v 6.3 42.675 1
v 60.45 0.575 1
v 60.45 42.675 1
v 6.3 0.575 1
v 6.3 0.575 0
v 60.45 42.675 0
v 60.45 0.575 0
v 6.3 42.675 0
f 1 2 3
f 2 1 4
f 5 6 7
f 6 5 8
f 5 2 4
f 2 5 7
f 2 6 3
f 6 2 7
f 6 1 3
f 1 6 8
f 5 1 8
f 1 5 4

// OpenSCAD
// file: ../libraries/commons.scad
/**
 * forEachCoord
 * Wrapper to apply child on each element
 */
module forEachCoord(coords_list) {
    for (coords = coords_list)
        translate(
            [
                coords[0] == undef ? 0 : coords[0],
                coords[1] == undef ? 0 : coords[1],
                coords[2] == undef ? 0 : coords[2],
            ]
        )
            children();
}
// file: ../enveloppes/screenEnveloppe.scad
include <../assets/lcd-screen/configurations.scad>

use <../libraries/commons.scad>

/**
 * screenFixationThrows
 * @name screenFixationThrows
 * @description screenFixationThrows
 * @type enveloppe
 * @parent root
 */
module screenFixationThrows(
    electronic_board_x_size = screen_asset_electronic_board_x_size,
    electronic_board_y_size = screen_asset_electronic_board_y_size,
    x_margin_left = screen_asset_x_margin_throws_left,
    x_margin_right = screen_asset_x_margin_throws_right,
    y_margin_top = screen_asset_y_margin_throws_top,
    y_margin_bottom = screen_asset_y_margin_throws_bottom,
    throw_diameter = 3.1,
    $fn = $fn
) {

    throws_z_size = 20;

    offset_coords_throw_list = [
        [
            x_margin_left,
            y_margin_bottom,
        ],
        [
            x_margin_left,
            electronic_board_y_size - y_margin_top,
        ],
        [
            electronic_board_x_size - x_margin_right,
            electronic_board_y_size - y_margin_top,
        ],
        [
            electronic_board_x_size - x_margin_right,
            y_margin_bottom,
        ]
    ];

    // Fixations throws
    translate([0,0, -throws_z_size / 2])
        forEachCoord(offset_coords_throw_list)
            cylinder(h = throws_z_size, d = throw_diameter, center = false, $fn = $fn);
}


/**
 * screenMainThrow
 * @name screenMainThrow
 * @description screenMainThrow
 * @type enveloppe
 * @parent root
 */
module screenMainThrow(
    electronic_board_x_size = screen_asset_electronic_board_x_size,
    electronic_board_y_size = screen_asset_electronic_board_y_size,
    screen_external_x_size = screen_asset_screen_external_x_size,
    screen_external_y_size = screen_asset_screen_external_y_size,
    screen_throw_x_margin = 2.8,
    screen_throw_y_margin = 0.5
) {

    throws_z_size = 20;

    // Main screen throw
    translate([
        (electronic_board_x_size - screen_external_x_size) / 2 - screen_throw_x_margin,
        (electronic_board_y_size - screen_external_y_size) / 2 - screen_throw_y_margin,
        -throws_z_size / 2
    ])
        cube(
            [
                screen_external_x_size + (screen_throw_x_margin * 2),
                screen_external_y_size + (screen_throw_y_margin * 2),
                throws_z_size,
            ]
        );
}

/**
 * screenConnectorThrow
 * @name screenConnectorThrow
 * @description screenConnectorThrow
 * @type enveloppe
 * @parent root
 */
module screenConnectorThrow(
    electronic_board_y_size = screen_asset_electronic_board_y_size
) {
    throws_z_size = 20;

    translate(
        [
            0.85 - (0.5 / 2),
            11.3,
            -throws_z_size / 2
        ]
    )
        cube(
            [
                2.5 + 0.5,
                electronic_board_y_size - (11.3 * 2),
                throws_z_size
            ]
        );
}

/**
 * sceenVisibleZoneCube
 * @name sceenVisibleZoneCube
 * @description sceenVisibleZoneCube
 * @type enveloppe
 * @parent root
 */
module sceenVisibleZoneCube(
    x_margin = 0,
    y_margin = 0,
    z_size = 0,

    electronic_board_x_size = screen_asset_electronic_board_x_size,
    electronic_board_y_size = screen_asset_electronic_board_y_size,
    screen_external_x_size = screen_asset_screen_external_x_size,
    screen_external_y_size = screen_asset_screen_external_y_size,
) {

    translate([
        (electronic_board_x_size - screen_external_x_size) / 2 + 1 - x_margin,
        (electronic_board_y_size - screen_external_y_size) / 2 + 1 - y_margin,
        0
    ])
        cube(
            [
                screen_external_x_size - 1 - 6.5 + (x_margin * 2),
                screen_external_y_size - 1 - 1 + (y_margin * 2),
                z_size,
            ]
        );
}

sceenVisibleZoneCube();
// file: ../configurations/global.scad
housing_facades_throws_diameter = 3.8;

// external size
case_external_x_size = 90;
case_external_y_size = 140;
case_external_z_size = 38;
case_external_panes_thickness = 4.8;

facade_front_round_edges_radius = 5;
facade_throws_margin = 5;

facade_front_fixation_throws_diameter = housing_facades_throws_diameter;

// facade corners
facade_corners_offset_lenght = 9;
facade_corners_main_x_size = 19;
facade_corners_main_y_size = 19;
facade_corners_main_thickness = 11;
facade_corners_correction_offset_length = 0.2;
facade_corners_correction_offset_thickness = 0.0;
facade_fn = 100;


facade_controller_coords = [
    case_external_x_size / 2,
    case_external_y_size / 2 - 30,
];


// Screen frames
screen_frame_electronic_board_margin = 3;
screen_frame_throw_diameter = 3.5;
screen_frame_piece_z_size = 1.5;
screen_frame_piece_glass_embedding_margin = 1;
screen_frame_piece_glass_embedding_z_depth = 1;
screen_frame_facade_piece_z_size = 1;
screen_frame_fn = 100;

screen_glass_visible_zone_x_margin = 0.7;
screen_glass_visible_zone_y_margin = 0.7;
screen_glass_z_size = 1;

facade_screen_coords = [
    case_external_x_size / 2,
    case_external_y_size / 2 + 28,
];


// Generics
insert_throw_diameter = 4.2;
insert_throw_length = 6 + 2;


// Controller facade
controller_breadboard_x_size_point = 28;
controller_breadboard_y_size_point = 9;

controller_facade_z_size = 2;
controller_facade_button_throw_margin = 1;
controller_facade_small_button_throw_margin = 0.5;
controller_facade_a_b_button_throw_margin = 0.5;

controller_facade_border_rounded_border_1 = 5;
controller_facade_border_rounded_border_2 = 4;

controller_facade_with_border_x_size = 82;
controller_facade_with_border_y_size = 47;

controller_facade_border_throws_margin = 5;
controller_braidboard_throw_margin = 1;

controller_facade_border_fn = 80;


// Cross Button
controller_cross_button_x_y_size = 20;
controller_cross_button_z_size = 4;
controller_cross_button_thickness = 6;
controller_cross_button_round_edges_radius = 1;
controller_cross_button_support_x_y_size = 22;
controller_cross_button_support_z_size = 1;
controller_cross_button_fn = 150;


// A and B Buttons
controller_a_b_button_diameter = 7.5;
controller_a_b_button_z_size = 4;
controller_a_b_button_support_diameter = 9.5;
controller_a_b_button_support_z_size = 1;
controller_a_b_button_fn = 80;


// small Buttons
controller_small_button_diameter = 5.5;
controller_small_button_z_size = 3;
controller_small_button_support_diameter = 7.5;
controller_small_button_support_z_size = 1;
controller_small_button_fn = 80;

// Directional cross
controller_directional_cross_points_coords = [6, 5];
controller_start_button_points_coords = [14, 3];
controller_select_button_points_coords = [18, 3];
controller_menu_button_points_coords = [14, 7];
controller_option_button_points_coords = [18, 7];
controller_a_button_points_coords = [23, 4];
controller_b_button_points_coords = [27, 6];
controller_bolt_throws_list = [
    [2, 2],
    [2, 8],
    [10, 2],
    [10, 8],
    [27, 2],
    [23, 8],
];


// usb charger holder
usb_charger_support_total_x_size = 17.57 + 15;
usb_charger_support_total_y_size = 12;
usb_charger_support_total_z_size = 2;


usb_charger_fixation_support_z_size = 4.5;
usb_charger_encaps_x_size = 17.57 + 1;
usb_charger_encaps_y_size = 27.85 + 1;
usb_charger_encaps_z_size = 1;

usb_charger_facade_x_fixation_spacing = 42;
usb_charger_facade_y_size = 1.36;
usb_charger_facade_z_size = 14;

usb_charger_throw_diameter = 3.5;
usb_charger_facade_holder_z_offset = 3.5; //
usb_charger_fixation_facade_y_margin = 0.5;
usb_charger_throw_offset_y = 4.5;
usb_charger_throw_offset_x = 3.5;
usb_charger_facade_fn = 100;

usb_charger_external_facade_main_throw_margin = 2;
usb_charger_external_facade_main_throw_diameter = housing_facades_throws_diameter;

usb_charger_coords = [
    28, 15
];


facade_top_on_off_button_throw_diameter = 12.8;

facade_top_on_off_button_coords = [
    case_external_x_size / 2 + 18,
    case_external_z_size / 2
];


// Bolt join Piece Mother board
bolt_join_mother_board_internal_diameter = 3.5;
bolt_join_mother_board_external_diameter = 3.5 + (0.4 * 6);
bolt_join_mother_board_height = 3;

// Bolt join Piece GamePadController
bolt_join_game_pad_internal_diameter = 3.5;
bolt_join_game_pad_external_diameter = 3.5 + (0.4 * 6);
bolt_join_game_pad_height = 6.5;

bolt_join_fn = 500;


// Mother board breadboard
mother_board_x_size_point = 25;
mother_board_y_size_point = 32;

mother_board_coords = [
    case_external_x_size / 2 - ((mother_board_x_size_point + 1) * 2.54) / 2,
    44,
    3
];

mother_board_bolt_throws_list = [
    [3, 2],
    [3, 17],
    [23, 2],
    [23, 17],
];


// Speaker
speaker_facade_throw_diameter = 28 + 1;
speaker_facade_z_size = 1.36;
speaker_facade_rounded_radius = 5;
// file: ../assets/lcd-screen/configurations.scad
screen_asset_electronic_board_x_size = 72.25;
screen_asset_electronic_board_y_size = 43.25;
screen_asset_electronic_board_z_size = 1.25;

screen_asset_screen_external_x_size = 60.25;
screen_asset_screen_external_y_size = 42.7;
screen_asset_screen_external_z_size = 4 - 1.25;

screen_asset_throw_diameter = 3.1;

screen_asset_x_margin_throws_left = 1.6 + 1.55;
screen_asset_x_margin_throws_right = 1.5 + 1.55;
screen_asset_y_margin_throws_top = 1.55 + 1.55;
screen_asset_y_margin_throws_bottom = 1.4 + 1.55;
// main file
include <../assets/lcd-screen/configurations.scad>
include <../configurations/global.scad>

use <../enveloppes/screenEnveloppe.scad>

/**
 * screenFrameFacadePiece
 * @name screenFrameFacadePiece
 * @description Piece CNC cutted
 * @type piece
 * @parent screenComponent
 */
module screenGlassPiece(
    visible_zone_x_margin = screen_glass_visible_zone_x_margin,
    visible_zone_y_margin = screen_glass_visible_zone_y_margin,
    z_size = screen_glass_z_size
) {
    color("LightGray", 0.5)
        sceenVisibleZoneCube(
            x_margin = visible_zone_x_margin,
            y_margin = visible_zone_y_margin,
            z_size = z_size
        );
}

/**
 * @stl
 * @png
 * @colorscheme BeforeDawn
 * @view axes,scales
 */
screenGlassPiece();
